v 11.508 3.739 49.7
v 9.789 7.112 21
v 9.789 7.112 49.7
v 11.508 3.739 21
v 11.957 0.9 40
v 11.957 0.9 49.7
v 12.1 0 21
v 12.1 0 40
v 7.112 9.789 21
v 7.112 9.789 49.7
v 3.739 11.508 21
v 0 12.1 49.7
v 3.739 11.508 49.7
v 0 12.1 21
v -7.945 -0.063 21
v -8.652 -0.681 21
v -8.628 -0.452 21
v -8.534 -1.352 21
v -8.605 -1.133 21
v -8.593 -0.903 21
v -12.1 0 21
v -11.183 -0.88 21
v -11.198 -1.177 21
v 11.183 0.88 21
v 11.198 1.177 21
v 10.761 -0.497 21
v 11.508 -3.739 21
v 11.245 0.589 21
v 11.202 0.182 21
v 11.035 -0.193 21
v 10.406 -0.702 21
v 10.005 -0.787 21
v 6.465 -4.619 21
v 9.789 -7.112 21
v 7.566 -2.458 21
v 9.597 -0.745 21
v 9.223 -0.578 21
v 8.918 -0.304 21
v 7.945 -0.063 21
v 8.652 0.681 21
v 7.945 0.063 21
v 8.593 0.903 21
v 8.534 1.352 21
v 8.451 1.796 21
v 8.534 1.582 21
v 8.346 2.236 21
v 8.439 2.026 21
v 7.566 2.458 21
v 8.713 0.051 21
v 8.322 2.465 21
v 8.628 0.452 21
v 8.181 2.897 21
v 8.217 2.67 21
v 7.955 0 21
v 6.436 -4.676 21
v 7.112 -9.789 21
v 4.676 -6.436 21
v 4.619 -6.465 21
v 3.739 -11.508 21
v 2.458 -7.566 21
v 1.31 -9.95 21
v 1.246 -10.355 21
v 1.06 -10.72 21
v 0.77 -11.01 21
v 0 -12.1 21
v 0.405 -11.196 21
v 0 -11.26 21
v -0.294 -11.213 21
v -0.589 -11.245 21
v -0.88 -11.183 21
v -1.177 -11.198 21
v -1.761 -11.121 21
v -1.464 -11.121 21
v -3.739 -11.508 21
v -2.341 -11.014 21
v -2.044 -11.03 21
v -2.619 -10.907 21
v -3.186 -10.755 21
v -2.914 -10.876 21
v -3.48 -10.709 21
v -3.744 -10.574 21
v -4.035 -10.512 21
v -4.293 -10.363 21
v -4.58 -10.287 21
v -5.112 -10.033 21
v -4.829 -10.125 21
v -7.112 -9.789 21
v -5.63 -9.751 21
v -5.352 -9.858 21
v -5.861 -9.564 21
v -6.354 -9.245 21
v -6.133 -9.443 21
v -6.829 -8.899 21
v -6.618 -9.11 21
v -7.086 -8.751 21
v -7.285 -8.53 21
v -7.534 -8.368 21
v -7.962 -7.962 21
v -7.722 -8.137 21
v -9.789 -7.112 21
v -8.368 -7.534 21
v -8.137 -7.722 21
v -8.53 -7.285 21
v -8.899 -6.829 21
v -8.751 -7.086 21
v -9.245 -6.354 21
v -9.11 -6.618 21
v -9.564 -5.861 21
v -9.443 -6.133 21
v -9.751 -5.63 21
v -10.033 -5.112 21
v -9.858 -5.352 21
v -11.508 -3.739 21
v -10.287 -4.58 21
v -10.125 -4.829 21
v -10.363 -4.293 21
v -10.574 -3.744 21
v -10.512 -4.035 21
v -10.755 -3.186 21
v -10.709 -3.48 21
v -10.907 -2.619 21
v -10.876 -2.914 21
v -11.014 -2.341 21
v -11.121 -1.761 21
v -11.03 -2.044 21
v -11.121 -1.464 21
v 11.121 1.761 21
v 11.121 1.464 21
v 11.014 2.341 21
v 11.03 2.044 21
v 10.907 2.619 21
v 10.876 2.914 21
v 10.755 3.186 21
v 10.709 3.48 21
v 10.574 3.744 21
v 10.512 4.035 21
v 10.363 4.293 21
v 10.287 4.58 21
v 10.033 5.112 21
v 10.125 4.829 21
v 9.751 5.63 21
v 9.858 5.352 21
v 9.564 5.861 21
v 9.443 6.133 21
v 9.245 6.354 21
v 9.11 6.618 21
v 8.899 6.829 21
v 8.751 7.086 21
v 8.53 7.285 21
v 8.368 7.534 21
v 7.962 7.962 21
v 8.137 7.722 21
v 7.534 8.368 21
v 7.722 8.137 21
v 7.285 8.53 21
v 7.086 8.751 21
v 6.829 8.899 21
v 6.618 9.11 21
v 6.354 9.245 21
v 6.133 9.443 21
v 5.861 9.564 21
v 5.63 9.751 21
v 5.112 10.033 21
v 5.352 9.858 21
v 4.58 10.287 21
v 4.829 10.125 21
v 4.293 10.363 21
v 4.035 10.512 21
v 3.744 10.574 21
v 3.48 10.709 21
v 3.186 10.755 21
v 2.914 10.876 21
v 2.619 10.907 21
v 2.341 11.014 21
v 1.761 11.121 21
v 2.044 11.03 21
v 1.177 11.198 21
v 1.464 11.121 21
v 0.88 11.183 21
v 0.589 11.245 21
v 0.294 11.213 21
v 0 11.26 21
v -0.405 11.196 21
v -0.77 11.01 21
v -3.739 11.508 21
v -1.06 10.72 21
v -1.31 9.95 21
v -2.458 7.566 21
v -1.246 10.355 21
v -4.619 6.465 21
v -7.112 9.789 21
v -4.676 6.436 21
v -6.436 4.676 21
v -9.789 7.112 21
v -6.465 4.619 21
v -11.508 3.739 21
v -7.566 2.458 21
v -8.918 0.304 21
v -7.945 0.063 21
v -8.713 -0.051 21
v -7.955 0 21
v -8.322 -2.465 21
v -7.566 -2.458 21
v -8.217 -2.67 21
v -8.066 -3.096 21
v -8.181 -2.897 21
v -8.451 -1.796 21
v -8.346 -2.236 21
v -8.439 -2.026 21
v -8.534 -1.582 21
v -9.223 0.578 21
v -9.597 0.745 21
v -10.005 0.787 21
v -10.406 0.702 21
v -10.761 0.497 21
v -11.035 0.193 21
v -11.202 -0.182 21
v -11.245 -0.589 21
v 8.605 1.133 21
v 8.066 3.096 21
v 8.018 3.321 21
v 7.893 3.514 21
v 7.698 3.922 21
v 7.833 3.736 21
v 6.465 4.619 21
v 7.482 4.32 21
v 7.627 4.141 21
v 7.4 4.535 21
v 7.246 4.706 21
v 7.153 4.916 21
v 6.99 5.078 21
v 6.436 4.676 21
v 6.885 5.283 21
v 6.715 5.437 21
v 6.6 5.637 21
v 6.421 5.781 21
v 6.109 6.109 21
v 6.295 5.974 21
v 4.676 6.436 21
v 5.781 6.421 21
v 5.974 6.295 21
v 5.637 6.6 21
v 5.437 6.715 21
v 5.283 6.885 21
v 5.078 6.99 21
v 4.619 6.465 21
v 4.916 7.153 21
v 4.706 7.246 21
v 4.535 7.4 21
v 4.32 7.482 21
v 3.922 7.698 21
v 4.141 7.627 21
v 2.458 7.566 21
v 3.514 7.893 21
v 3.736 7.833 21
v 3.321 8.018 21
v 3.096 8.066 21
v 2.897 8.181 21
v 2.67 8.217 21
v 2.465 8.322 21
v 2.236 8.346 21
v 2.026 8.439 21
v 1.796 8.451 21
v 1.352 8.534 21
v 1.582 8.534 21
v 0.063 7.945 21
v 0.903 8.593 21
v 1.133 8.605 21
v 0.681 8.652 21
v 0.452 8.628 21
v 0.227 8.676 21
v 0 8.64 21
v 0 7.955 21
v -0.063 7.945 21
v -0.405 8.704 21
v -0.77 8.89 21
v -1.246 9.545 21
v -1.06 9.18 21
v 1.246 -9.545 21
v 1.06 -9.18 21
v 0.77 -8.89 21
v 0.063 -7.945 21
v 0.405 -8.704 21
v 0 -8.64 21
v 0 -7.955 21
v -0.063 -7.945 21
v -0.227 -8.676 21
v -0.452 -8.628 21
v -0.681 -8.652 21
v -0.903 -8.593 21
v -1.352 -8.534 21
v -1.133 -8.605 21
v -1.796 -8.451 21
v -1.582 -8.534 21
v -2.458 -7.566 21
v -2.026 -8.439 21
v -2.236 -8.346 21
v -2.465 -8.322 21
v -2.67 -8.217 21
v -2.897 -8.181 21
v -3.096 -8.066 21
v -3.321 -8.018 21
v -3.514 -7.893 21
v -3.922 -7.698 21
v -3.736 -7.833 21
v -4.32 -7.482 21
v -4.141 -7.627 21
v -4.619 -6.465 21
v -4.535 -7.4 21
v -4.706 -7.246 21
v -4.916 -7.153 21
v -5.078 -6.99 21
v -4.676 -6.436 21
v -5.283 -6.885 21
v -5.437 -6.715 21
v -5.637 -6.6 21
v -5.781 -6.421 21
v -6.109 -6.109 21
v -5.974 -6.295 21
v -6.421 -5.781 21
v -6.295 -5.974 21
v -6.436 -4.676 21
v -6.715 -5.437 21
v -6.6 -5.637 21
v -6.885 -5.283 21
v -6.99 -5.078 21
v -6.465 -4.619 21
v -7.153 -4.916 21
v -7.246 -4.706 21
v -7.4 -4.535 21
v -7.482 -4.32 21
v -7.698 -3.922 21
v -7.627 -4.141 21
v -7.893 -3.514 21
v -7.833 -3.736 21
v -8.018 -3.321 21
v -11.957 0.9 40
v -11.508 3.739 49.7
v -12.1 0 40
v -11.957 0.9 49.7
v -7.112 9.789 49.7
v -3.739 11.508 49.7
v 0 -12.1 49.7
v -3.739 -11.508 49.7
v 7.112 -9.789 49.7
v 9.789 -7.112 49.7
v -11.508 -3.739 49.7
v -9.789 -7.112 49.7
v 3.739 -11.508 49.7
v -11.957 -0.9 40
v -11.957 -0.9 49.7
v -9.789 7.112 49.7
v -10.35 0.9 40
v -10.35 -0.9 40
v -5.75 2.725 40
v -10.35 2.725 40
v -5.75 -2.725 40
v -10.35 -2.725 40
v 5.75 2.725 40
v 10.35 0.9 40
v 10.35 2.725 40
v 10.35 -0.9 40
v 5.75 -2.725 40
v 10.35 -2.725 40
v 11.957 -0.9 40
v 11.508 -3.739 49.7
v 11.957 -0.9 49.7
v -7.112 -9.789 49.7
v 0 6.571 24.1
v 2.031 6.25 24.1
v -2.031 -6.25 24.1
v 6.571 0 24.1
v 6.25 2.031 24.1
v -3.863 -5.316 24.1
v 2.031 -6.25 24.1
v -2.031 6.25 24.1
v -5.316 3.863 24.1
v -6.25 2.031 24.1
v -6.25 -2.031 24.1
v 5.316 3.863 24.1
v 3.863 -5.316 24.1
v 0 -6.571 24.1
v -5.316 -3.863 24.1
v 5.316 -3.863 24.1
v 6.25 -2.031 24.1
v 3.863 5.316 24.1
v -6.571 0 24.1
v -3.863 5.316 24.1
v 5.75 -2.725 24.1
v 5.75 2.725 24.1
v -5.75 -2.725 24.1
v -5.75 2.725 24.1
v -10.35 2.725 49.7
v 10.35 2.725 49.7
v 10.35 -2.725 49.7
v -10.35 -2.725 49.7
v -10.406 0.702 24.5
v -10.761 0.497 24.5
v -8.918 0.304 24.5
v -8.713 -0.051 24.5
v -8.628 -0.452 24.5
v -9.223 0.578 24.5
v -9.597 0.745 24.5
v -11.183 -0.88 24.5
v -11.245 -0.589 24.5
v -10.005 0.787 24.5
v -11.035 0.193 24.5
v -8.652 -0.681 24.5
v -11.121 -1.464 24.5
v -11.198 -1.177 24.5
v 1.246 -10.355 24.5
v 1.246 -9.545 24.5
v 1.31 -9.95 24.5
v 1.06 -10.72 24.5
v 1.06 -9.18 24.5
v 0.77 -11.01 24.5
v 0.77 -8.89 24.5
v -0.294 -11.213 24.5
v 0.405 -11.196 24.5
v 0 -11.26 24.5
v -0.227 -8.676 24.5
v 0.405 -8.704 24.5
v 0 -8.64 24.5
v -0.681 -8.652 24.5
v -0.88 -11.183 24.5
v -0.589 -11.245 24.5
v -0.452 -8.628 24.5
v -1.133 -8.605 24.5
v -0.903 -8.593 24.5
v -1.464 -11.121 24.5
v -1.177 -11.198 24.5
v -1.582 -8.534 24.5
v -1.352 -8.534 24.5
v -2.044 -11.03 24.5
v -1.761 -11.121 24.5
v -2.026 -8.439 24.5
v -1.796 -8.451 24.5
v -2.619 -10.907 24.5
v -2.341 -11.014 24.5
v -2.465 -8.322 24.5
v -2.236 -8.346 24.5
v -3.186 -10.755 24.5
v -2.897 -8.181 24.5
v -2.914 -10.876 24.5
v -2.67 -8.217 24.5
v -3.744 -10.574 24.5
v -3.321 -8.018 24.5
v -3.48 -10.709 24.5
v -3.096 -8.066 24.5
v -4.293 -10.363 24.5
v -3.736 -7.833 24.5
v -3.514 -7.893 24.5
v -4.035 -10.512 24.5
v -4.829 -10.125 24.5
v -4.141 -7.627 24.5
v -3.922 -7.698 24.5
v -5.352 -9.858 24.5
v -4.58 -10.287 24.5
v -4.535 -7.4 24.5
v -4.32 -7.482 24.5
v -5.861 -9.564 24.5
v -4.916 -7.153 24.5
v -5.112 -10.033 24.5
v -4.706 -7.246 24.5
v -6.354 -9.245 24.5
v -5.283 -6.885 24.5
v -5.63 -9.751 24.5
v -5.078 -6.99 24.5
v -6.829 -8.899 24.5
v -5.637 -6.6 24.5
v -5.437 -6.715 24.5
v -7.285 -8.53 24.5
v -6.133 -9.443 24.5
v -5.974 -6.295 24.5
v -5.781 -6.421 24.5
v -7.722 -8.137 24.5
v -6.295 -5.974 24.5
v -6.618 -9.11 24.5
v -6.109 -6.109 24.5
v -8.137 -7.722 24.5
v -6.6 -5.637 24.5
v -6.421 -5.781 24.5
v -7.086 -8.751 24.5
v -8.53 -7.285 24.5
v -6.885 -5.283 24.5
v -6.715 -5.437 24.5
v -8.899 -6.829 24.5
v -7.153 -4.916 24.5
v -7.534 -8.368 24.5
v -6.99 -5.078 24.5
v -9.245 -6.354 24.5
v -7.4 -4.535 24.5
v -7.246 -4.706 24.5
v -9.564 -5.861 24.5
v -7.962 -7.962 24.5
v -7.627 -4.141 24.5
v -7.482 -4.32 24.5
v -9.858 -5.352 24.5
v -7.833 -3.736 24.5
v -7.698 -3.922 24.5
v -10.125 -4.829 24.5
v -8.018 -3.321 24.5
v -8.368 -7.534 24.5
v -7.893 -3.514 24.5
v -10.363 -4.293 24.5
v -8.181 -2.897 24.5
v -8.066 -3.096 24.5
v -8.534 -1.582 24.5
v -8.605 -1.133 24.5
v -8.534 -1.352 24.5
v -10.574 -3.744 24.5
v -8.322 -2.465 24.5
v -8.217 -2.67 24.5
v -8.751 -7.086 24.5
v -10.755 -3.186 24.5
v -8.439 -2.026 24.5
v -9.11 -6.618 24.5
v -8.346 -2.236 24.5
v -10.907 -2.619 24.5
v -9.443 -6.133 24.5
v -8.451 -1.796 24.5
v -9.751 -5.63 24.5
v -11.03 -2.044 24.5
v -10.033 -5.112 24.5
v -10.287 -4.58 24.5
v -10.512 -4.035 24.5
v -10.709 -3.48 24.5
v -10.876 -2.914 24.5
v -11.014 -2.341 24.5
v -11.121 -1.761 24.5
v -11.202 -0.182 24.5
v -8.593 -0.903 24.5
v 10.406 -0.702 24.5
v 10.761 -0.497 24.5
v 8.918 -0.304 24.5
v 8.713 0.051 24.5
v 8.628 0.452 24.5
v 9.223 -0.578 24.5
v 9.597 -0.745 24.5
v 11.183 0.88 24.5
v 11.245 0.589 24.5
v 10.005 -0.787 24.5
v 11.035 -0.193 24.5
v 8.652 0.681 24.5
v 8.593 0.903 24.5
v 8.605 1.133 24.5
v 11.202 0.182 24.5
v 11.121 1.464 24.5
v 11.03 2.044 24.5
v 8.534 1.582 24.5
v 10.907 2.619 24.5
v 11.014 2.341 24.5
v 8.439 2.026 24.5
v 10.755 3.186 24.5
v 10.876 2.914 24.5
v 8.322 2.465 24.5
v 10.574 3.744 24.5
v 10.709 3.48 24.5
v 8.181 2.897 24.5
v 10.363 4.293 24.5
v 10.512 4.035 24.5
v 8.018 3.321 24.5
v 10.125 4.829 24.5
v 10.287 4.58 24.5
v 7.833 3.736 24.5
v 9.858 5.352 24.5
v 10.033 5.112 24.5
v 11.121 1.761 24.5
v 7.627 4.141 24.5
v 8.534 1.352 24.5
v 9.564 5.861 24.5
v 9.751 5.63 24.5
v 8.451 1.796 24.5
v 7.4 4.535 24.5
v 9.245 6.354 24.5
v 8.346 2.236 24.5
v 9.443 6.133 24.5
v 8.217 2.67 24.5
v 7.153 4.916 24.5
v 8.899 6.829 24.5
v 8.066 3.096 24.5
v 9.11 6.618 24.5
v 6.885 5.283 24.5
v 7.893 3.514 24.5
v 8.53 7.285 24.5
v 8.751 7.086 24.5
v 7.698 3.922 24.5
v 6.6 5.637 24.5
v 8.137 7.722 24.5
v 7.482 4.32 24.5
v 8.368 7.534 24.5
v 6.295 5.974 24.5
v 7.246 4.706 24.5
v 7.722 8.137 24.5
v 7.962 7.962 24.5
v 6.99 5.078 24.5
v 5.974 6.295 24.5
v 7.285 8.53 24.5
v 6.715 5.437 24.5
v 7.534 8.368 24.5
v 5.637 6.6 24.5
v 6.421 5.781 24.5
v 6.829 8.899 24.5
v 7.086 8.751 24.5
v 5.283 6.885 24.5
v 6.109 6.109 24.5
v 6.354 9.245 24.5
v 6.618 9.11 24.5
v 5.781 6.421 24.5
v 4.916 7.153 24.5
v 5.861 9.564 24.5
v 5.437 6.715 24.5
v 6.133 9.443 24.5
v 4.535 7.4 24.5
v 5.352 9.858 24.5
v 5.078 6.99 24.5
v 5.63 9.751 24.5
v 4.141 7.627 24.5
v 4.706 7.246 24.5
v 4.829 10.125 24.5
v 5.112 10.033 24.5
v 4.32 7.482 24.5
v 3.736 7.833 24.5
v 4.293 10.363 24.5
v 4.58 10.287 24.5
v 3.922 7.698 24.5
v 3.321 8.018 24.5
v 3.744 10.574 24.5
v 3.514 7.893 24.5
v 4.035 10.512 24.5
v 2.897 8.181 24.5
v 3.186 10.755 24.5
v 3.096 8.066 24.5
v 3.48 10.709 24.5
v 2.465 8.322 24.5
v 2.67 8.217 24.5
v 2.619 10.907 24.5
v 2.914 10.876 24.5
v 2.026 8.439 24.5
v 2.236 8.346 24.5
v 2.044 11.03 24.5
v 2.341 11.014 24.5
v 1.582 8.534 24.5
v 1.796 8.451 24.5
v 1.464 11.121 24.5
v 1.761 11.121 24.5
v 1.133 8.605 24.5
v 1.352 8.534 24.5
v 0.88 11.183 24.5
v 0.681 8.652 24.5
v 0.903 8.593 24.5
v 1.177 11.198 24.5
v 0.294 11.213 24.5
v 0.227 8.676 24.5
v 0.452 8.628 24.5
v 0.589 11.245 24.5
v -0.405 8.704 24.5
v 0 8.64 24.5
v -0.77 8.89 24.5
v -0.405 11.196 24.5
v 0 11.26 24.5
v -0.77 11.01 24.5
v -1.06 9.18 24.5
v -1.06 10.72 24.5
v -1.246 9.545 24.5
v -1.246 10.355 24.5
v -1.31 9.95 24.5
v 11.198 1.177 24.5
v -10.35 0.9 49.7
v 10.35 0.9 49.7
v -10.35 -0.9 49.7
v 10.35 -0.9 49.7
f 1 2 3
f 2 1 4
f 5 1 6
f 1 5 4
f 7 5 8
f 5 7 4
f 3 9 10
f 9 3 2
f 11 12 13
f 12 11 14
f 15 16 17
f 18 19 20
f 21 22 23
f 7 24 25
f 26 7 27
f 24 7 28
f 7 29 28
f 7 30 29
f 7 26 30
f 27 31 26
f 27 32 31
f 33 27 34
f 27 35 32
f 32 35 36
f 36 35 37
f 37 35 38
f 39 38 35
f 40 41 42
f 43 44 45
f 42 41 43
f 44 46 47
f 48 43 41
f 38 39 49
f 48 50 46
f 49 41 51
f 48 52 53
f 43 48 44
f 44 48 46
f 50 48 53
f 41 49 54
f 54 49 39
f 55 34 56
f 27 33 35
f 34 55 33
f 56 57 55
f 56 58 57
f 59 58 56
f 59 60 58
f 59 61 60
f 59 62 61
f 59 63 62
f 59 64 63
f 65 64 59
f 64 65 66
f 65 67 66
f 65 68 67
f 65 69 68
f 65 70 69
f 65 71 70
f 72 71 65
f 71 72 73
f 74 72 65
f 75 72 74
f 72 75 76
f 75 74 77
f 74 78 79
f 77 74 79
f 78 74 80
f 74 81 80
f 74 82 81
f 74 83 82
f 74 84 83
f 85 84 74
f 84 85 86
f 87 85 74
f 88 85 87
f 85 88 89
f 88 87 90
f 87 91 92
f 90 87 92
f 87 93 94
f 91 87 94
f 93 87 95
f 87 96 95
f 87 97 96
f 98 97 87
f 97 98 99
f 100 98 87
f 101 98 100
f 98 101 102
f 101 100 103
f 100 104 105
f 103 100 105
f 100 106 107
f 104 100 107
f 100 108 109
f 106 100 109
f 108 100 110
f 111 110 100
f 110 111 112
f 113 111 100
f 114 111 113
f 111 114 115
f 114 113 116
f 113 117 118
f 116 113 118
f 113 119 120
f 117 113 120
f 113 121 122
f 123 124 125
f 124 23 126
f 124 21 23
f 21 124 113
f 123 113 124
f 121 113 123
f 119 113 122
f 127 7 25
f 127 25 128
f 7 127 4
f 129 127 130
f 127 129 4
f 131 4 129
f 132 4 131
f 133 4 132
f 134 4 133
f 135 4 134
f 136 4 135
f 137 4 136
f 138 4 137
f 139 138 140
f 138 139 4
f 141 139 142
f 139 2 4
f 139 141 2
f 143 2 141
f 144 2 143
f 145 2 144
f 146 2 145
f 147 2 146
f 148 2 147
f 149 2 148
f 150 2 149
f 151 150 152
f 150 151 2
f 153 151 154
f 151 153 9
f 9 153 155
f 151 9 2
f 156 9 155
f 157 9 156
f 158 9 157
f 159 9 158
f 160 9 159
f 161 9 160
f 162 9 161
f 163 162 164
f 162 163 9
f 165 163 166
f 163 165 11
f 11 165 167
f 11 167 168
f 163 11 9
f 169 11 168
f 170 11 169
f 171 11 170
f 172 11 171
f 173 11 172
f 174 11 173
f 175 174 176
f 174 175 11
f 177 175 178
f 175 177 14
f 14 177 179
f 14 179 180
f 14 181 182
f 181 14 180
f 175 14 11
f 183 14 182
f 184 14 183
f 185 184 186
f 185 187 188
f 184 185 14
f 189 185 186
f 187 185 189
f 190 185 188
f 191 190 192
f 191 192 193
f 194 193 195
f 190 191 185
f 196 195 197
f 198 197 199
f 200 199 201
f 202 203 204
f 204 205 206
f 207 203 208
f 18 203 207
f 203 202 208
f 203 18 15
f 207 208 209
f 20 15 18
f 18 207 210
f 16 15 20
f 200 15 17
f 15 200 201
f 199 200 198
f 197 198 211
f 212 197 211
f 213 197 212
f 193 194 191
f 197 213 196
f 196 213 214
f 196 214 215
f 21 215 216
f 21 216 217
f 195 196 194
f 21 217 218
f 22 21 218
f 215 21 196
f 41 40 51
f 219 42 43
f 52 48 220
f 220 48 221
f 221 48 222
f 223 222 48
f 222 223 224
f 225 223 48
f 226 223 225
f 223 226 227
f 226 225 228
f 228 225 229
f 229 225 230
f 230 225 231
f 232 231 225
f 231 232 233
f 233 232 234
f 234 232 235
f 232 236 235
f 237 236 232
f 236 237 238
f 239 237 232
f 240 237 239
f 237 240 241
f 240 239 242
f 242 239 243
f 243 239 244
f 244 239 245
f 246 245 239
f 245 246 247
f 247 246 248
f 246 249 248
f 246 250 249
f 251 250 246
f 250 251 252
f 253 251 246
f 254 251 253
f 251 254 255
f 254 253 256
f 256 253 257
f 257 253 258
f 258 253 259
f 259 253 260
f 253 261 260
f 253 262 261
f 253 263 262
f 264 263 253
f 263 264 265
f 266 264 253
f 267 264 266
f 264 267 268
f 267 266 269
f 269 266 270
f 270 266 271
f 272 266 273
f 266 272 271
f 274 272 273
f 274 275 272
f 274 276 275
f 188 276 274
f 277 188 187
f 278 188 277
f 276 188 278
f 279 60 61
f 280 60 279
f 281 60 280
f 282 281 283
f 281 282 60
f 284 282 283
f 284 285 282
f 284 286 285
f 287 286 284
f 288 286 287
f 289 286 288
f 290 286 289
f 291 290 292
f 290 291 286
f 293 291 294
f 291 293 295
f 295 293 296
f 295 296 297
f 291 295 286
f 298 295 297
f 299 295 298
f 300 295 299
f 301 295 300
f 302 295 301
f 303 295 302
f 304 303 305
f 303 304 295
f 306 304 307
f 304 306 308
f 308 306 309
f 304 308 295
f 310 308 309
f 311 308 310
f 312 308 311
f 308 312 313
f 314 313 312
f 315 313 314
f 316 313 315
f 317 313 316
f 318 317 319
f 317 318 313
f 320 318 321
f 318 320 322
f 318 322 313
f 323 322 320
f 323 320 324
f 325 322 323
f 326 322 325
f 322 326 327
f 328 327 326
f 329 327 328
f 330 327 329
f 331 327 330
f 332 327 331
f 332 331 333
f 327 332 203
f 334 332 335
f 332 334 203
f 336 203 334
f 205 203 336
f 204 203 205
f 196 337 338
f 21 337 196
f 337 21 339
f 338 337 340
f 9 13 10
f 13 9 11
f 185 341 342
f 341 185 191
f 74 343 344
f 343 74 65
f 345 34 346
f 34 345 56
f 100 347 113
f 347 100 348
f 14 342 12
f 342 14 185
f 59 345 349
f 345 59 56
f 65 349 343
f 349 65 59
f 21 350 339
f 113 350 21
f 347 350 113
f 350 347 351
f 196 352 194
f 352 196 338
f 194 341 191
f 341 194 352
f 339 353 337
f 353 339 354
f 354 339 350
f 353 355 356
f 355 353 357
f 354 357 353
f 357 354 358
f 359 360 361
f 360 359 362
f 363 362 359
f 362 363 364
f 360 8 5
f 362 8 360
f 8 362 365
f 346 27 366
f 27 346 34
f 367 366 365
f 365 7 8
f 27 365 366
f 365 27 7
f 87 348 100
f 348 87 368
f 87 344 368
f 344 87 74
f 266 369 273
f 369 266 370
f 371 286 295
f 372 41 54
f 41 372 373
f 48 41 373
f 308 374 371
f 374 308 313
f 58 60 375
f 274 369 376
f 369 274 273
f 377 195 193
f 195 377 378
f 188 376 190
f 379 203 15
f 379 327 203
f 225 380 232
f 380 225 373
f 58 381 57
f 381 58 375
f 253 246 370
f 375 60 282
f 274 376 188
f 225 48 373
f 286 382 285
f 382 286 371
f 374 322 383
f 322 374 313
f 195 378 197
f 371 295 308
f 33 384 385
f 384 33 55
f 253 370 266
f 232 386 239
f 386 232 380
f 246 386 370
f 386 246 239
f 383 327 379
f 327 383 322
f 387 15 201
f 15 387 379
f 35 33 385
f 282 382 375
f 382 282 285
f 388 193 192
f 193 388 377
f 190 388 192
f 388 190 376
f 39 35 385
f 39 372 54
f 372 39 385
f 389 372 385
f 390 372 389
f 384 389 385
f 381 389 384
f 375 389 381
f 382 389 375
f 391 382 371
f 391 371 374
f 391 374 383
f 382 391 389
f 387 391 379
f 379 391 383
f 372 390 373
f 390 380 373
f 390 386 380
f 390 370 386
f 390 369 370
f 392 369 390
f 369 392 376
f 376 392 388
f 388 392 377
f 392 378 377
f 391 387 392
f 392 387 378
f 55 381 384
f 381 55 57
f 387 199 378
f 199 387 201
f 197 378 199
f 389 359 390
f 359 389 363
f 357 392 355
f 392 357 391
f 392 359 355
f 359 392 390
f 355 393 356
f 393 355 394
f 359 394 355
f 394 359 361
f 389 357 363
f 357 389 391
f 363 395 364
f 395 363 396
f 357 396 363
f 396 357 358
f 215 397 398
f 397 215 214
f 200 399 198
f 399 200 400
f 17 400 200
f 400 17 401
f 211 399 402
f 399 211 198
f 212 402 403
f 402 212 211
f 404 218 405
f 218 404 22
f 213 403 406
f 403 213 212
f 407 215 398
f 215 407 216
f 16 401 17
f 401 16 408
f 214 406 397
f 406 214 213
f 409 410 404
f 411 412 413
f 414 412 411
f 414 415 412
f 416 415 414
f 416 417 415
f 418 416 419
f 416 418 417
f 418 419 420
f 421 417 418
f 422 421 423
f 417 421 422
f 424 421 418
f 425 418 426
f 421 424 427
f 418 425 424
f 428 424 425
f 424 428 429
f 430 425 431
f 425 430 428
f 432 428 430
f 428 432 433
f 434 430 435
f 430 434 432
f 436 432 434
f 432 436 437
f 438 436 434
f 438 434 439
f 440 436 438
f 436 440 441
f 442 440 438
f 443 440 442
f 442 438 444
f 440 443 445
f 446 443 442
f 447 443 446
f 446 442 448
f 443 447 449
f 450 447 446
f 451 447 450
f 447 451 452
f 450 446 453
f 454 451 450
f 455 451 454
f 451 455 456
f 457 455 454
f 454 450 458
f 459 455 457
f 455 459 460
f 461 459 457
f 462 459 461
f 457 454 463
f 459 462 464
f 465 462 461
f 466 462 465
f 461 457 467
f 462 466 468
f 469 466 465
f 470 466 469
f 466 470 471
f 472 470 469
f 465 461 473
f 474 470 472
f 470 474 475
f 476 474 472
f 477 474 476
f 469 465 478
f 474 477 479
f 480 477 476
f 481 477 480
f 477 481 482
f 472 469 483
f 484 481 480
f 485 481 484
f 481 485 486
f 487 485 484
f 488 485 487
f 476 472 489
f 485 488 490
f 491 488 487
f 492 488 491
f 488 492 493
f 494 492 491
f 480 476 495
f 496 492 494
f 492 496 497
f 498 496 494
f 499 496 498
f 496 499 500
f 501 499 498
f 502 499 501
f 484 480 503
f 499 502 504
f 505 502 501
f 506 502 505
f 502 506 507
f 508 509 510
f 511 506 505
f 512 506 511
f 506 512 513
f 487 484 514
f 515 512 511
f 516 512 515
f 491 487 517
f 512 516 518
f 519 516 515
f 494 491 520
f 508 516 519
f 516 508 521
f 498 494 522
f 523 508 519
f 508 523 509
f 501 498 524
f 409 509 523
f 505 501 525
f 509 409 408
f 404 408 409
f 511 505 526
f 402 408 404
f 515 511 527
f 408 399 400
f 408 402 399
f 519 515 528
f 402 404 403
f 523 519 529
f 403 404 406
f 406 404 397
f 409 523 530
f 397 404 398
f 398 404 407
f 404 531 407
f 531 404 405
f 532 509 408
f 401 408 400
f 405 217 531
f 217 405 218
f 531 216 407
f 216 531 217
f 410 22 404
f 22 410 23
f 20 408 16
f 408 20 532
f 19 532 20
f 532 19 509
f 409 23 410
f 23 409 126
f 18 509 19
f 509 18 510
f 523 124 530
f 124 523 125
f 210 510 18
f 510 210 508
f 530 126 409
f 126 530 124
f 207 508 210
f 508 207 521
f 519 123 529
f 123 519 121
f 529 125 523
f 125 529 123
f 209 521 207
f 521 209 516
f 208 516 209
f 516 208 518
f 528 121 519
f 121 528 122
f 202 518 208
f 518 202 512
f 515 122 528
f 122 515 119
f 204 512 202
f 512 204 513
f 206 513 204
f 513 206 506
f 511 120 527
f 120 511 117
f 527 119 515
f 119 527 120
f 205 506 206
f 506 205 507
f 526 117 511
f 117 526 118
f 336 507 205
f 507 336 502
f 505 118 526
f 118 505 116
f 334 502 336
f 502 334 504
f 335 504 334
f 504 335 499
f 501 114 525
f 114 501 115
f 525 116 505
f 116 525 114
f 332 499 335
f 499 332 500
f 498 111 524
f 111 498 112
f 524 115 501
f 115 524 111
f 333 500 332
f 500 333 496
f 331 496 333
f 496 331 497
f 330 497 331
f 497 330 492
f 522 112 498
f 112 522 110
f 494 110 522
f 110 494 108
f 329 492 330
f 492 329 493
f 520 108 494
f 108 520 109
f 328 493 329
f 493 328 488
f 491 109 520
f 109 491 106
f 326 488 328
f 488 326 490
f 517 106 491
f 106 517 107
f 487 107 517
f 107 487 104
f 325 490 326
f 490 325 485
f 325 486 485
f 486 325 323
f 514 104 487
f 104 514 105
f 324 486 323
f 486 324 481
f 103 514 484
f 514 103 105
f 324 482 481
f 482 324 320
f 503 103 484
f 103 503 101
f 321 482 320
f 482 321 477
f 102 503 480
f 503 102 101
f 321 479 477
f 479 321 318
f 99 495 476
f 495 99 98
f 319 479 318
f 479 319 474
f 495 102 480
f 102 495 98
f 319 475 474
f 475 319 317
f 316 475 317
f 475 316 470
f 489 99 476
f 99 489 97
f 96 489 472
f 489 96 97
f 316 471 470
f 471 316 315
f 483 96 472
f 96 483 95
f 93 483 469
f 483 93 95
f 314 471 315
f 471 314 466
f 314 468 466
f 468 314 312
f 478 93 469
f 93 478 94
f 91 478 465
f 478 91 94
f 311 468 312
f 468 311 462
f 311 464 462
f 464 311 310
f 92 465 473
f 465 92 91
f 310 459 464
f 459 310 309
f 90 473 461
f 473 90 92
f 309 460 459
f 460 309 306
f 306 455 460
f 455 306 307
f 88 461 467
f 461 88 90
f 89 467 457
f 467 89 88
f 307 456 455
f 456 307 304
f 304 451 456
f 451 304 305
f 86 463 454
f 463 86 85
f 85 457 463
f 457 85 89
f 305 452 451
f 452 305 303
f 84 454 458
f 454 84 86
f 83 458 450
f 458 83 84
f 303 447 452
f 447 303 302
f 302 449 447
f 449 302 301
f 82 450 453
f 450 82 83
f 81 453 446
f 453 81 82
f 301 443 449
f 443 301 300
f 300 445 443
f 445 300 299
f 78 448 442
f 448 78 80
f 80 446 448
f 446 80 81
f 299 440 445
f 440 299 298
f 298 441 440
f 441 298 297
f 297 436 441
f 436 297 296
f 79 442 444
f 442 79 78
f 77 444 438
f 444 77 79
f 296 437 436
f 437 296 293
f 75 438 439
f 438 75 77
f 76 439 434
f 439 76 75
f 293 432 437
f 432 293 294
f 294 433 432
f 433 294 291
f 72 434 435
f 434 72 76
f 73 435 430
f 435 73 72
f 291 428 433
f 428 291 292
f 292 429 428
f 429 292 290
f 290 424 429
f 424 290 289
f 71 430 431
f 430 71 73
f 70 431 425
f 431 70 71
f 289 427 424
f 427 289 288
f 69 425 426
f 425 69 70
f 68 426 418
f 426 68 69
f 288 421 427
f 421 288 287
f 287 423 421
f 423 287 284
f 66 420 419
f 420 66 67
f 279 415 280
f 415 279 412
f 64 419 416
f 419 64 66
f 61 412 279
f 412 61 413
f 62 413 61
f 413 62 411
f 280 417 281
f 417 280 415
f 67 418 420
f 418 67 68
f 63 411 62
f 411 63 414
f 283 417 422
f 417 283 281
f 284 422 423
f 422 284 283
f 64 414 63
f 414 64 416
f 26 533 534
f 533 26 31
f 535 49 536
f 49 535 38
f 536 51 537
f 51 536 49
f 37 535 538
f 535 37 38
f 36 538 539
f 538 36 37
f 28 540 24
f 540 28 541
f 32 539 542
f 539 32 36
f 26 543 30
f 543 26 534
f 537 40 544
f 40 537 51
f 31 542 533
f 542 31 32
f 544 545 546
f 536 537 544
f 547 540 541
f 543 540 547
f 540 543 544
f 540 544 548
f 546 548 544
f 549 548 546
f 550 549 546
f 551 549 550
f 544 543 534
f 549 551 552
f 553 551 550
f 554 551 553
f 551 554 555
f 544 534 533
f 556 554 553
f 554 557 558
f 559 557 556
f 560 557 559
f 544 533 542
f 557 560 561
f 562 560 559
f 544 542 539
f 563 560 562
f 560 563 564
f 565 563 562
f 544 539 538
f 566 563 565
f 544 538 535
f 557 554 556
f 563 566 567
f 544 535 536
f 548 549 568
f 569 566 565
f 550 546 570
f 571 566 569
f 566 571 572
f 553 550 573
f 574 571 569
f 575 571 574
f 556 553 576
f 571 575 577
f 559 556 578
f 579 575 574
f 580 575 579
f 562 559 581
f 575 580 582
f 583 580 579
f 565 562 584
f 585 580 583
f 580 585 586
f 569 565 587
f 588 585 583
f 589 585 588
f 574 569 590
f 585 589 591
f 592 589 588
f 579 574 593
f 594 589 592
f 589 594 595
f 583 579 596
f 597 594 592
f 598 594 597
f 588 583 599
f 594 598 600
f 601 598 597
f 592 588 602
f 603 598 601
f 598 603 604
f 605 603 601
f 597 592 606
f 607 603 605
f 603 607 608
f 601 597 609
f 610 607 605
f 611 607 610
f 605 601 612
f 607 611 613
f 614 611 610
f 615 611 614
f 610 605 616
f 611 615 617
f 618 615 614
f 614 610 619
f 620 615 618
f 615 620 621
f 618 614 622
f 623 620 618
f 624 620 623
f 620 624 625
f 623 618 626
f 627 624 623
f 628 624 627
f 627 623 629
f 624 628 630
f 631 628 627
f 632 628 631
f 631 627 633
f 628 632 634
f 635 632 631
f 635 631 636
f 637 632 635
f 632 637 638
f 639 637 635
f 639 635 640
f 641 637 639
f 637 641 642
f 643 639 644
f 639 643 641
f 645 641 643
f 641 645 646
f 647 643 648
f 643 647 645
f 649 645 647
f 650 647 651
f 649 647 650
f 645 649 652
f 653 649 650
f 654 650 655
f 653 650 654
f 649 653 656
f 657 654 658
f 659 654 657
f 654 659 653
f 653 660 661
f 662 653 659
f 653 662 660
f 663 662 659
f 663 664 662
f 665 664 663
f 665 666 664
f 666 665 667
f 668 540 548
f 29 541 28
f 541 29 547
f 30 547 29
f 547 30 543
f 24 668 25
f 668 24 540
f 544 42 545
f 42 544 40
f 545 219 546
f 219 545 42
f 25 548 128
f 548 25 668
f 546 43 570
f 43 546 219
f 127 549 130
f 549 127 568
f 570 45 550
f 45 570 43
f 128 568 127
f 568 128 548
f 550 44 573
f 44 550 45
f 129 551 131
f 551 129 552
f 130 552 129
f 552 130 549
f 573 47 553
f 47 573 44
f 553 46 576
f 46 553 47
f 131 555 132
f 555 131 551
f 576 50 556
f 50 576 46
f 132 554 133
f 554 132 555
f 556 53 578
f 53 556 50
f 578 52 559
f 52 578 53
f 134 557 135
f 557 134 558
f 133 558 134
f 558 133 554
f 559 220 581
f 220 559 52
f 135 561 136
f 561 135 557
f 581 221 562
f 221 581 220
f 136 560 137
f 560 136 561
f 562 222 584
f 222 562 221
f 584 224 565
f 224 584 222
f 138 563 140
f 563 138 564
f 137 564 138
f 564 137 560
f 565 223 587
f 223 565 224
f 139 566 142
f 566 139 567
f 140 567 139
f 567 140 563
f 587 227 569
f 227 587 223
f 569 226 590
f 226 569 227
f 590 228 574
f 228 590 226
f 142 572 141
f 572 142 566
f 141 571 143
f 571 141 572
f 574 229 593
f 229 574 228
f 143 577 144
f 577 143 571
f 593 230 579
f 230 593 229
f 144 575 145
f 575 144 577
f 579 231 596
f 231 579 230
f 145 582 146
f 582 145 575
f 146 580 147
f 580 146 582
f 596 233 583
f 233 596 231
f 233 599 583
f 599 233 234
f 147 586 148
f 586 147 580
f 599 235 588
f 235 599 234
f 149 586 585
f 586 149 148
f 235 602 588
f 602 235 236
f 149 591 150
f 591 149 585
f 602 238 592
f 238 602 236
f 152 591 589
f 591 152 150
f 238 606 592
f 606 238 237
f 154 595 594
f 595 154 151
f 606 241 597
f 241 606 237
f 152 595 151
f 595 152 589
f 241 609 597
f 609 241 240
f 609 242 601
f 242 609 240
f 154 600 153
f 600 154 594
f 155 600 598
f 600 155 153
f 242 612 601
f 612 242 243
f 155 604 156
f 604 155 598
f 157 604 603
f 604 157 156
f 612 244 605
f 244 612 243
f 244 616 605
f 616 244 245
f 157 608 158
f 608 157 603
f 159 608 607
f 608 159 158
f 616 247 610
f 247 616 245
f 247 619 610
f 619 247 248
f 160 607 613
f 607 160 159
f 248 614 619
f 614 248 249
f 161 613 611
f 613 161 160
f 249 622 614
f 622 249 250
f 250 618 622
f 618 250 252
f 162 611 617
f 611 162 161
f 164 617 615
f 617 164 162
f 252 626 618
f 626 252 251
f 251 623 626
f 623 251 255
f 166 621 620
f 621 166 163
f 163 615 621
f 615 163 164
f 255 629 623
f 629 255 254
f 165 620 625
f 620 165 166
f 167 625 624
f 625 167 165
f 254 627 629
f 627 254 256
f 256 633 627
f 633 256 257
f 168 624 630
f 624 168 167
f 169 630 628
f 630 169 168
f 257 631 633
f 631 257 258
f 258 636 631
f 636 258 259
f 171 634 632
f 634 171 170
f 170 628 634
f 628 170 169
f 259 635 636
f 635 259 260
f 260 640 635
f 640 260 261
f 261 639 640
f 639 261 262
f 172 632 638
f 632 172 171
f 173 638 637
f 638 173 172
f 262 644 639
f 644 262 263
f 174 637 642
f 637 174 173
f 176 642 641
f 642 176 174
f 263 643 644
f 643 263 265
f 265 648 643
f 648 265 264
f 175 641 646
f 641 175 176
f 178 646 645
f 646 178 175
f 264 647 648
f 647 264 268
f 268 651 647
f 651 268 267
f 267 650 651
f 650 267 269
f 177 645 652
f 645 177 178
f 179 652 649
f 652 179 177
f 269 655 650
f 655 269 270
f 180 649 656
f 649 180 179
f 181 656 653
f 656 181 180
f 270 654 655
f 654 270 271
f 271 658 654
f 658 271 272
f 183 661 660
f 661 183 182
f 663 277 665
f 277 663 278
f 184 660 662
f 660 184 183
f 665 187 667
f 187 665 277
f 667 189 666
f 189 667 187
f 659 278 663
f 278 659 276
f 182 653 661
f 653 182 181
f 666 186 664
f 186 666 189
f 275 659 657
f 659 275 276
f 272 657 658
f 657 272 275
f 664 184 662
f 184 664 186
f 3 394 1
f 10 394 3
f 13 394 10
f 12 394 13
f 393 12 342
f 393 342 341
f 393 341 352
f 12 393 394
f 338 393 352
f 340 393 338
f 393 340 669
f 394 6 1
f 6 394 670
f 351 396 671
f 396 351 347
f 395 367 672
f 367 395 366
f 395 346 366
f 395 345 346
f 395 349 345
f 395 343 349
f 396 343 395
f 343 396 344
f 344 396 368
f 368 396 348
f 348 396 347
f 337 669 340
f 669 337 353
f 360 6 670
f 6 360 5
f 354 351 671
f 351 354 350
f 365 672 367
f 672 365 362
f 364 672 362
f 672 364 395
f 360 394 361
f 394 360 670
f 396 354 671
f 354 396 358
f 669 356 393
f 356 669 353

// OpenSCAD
// file: electrodo.scad
// Éste lo uso para que forme parte de: Cabezal para ECG(Parte de abajo, con 8 electrodos)

radio_base_electrodo=4.30;//radio de la base
radio_arriba_electrodo=1.5;//es el radio de la parte de arriba del electrodo
radio_esfera=2.35; //es el radio de la esfera de la punta del electrodo
altura_electrodo=4.30;
altura_abajo_electrodo=1.20+0.1; //la altura de la base del electrodo
altura_arriba_electrodo=altura_electrodo-altura_abajo_electrodo+0.2;
altura_arriba=(altura_abajo_electrodo/2)+altura_arriba_electrodo;
fn1=100;

  module electrodo() 
  translate([0,0,-0.1])
   {
    translate([0,0,altura_abajo_electrodo/2])
     union() //esta union se utiliza para el hueco en donde va el electrodo
     {
      cylinder(r=radio_base_electrodo,h=altura_abajo_electrodo,$fn=fn1,center=true);//cilindro en la base
   
      translate([0,0,altura_abajo_electrodo/2])
       cylinder(r=radio_arriba_electrodo,h=(altura_arriba_electrodo-radio_esfera),$fn=fn1);
  
      translate([0,0,altura_arriba-radio_esfera])
       sphere(r=radio_esfera,$fn=fn1);//la esfera que esta en del electrodo
     }
    }
// main file
//cyntia vilte 6 de Junio version 3.0 Cabezal para ECG(Parte de arriba)

use <electrodo.scad>
fn1=20;
radio_base=20;   
radio_techo=12.1; // radio de la parte de arriba de la base
altura_techo=11;//altura del cilindro de la parte de arriba(techo) 
altura_base=10; //altura del cilindro de la parte de abajo(base)
radio_adentro_base=5.14;//del cilindro con el cual lo diferencio con el cilindro de la base
radio_adentro_techo=3.5;//del cilindro con el cual lo diferencio con el cilindro del techo

      //esto pertenece a la parte en donde iran los cables,abajo de la plaqueta
      
radio_adentro2_techo=8; // radio de la parte de arriba en donde iran cables
altura_techo2=19; // la altura de la parte en donde iran cables
 //utilizo las siguientes variables para formar un hueco en forma de cubo
x_hueco=11.5;
x_hueco2=(radio_techo*2)-3.5; //lo utilizo para el hueco cubico de la parte de arriba
y_hueco=5.45;
z_hueco=16;
            //esta parte es en donde esta el hueco rectangular en la parte de arriba
            
altura2_techo=9.7; //la parte de arriba del techo
ancho_rectangulo=1.8; //el rectangulo que uso para hacer el hueco

union()
 {
  difference()// agujero en la parte de abajo, mas los dos huecos en donde se lo enganchara con la base
     {   
      difference()
       {
        translate([0,0,altura_base+altura_techo]) //aca iran adentro en el hueco cables 
         difference()
          {
           cylinder(r=radio_techo,h=altura_techo2,$fn=fn1); //cilindro de arriba(la parte de afuera)
           translate([0,0,-0.1])
            cylinder(r1=radio_adentro2_techo,r2=(x_hueco/1.75),h=altura_techo2-z_hueco+0.2,$fn=fn1); //cilindro de la parte de adentro
           }  
          translate([-(x_hueco/2),-(y_hueco/2),(altura_base+altura_techo)+altura_techo2-z_hueco]) 
           cube([x_hueco,y_hueco,z_hueco+1]);  //hueco cubico
         }
      translate([0,0,-0.2])
       for(k=[1:30])//para las dos ramificaciones que tendrá para poder sujetarse a la parte de arriba
        rotate([0,0,k*3])
         translate([-radio_techo+2.15,0,altura_techo+altura_base],$fn=fn1)
          cylinder(r=1.31,h=3.7,$fn=fn1);
   
      translate([0,0,-0.2])
       rotate([0,0,180])
        for(k=[1:30])//para las dos ramificaciones que tendrá para poder sujetarse a la parte de arriba
         rotate([0,0,k*3])
          translate([-radio_techo+2.15,0,altura_techo+altura_base])
           cylinder(r=1.31,h=3.7,$fn=fn1);
      }
  //parte en donde ira la plaqueta
    
  difference()
  {    
   difference()
    {
     translate([0,0,altura_techo/2+altura_techo2])
      difference() //la parte de arriba del techo, va a tener un hueco rectangular
       {
        translate([0,0,(altura_techo/2)+altura_base])
         cylinder(r=radio_techo,h=altura2_techo,$fn=fn1); //la parte de arriba de altura_adentro_techo
        translate([-radio_techo,-(ancho_rectangulo/2),altura_base+(altura_techo/2)])
         cube([radio_techo*2,ancho_rectangulo,altura2_techo+0.5]);  //es el hueco rectangular
       }
       
   //este hueco se encuentra en la parte de arriba(en el hueco en donde ira la plaqueta)
   
     translate([-(x_hueco/2),-(ancho_rectangulo/2),altura_base+altura_techo2+altura_techo-0.2])
      cube([x_hueco,ancho_rectangulo,1]);
    }
    translate([-radio_techo+1.75,-(y_hueco/2),(altura_base+altura_techo)+altura_techo2-0.2]) 
     cube([x_hueco2,y_hueco,altura2_techo+0.5]);  //hueco cubico
  }
 }
